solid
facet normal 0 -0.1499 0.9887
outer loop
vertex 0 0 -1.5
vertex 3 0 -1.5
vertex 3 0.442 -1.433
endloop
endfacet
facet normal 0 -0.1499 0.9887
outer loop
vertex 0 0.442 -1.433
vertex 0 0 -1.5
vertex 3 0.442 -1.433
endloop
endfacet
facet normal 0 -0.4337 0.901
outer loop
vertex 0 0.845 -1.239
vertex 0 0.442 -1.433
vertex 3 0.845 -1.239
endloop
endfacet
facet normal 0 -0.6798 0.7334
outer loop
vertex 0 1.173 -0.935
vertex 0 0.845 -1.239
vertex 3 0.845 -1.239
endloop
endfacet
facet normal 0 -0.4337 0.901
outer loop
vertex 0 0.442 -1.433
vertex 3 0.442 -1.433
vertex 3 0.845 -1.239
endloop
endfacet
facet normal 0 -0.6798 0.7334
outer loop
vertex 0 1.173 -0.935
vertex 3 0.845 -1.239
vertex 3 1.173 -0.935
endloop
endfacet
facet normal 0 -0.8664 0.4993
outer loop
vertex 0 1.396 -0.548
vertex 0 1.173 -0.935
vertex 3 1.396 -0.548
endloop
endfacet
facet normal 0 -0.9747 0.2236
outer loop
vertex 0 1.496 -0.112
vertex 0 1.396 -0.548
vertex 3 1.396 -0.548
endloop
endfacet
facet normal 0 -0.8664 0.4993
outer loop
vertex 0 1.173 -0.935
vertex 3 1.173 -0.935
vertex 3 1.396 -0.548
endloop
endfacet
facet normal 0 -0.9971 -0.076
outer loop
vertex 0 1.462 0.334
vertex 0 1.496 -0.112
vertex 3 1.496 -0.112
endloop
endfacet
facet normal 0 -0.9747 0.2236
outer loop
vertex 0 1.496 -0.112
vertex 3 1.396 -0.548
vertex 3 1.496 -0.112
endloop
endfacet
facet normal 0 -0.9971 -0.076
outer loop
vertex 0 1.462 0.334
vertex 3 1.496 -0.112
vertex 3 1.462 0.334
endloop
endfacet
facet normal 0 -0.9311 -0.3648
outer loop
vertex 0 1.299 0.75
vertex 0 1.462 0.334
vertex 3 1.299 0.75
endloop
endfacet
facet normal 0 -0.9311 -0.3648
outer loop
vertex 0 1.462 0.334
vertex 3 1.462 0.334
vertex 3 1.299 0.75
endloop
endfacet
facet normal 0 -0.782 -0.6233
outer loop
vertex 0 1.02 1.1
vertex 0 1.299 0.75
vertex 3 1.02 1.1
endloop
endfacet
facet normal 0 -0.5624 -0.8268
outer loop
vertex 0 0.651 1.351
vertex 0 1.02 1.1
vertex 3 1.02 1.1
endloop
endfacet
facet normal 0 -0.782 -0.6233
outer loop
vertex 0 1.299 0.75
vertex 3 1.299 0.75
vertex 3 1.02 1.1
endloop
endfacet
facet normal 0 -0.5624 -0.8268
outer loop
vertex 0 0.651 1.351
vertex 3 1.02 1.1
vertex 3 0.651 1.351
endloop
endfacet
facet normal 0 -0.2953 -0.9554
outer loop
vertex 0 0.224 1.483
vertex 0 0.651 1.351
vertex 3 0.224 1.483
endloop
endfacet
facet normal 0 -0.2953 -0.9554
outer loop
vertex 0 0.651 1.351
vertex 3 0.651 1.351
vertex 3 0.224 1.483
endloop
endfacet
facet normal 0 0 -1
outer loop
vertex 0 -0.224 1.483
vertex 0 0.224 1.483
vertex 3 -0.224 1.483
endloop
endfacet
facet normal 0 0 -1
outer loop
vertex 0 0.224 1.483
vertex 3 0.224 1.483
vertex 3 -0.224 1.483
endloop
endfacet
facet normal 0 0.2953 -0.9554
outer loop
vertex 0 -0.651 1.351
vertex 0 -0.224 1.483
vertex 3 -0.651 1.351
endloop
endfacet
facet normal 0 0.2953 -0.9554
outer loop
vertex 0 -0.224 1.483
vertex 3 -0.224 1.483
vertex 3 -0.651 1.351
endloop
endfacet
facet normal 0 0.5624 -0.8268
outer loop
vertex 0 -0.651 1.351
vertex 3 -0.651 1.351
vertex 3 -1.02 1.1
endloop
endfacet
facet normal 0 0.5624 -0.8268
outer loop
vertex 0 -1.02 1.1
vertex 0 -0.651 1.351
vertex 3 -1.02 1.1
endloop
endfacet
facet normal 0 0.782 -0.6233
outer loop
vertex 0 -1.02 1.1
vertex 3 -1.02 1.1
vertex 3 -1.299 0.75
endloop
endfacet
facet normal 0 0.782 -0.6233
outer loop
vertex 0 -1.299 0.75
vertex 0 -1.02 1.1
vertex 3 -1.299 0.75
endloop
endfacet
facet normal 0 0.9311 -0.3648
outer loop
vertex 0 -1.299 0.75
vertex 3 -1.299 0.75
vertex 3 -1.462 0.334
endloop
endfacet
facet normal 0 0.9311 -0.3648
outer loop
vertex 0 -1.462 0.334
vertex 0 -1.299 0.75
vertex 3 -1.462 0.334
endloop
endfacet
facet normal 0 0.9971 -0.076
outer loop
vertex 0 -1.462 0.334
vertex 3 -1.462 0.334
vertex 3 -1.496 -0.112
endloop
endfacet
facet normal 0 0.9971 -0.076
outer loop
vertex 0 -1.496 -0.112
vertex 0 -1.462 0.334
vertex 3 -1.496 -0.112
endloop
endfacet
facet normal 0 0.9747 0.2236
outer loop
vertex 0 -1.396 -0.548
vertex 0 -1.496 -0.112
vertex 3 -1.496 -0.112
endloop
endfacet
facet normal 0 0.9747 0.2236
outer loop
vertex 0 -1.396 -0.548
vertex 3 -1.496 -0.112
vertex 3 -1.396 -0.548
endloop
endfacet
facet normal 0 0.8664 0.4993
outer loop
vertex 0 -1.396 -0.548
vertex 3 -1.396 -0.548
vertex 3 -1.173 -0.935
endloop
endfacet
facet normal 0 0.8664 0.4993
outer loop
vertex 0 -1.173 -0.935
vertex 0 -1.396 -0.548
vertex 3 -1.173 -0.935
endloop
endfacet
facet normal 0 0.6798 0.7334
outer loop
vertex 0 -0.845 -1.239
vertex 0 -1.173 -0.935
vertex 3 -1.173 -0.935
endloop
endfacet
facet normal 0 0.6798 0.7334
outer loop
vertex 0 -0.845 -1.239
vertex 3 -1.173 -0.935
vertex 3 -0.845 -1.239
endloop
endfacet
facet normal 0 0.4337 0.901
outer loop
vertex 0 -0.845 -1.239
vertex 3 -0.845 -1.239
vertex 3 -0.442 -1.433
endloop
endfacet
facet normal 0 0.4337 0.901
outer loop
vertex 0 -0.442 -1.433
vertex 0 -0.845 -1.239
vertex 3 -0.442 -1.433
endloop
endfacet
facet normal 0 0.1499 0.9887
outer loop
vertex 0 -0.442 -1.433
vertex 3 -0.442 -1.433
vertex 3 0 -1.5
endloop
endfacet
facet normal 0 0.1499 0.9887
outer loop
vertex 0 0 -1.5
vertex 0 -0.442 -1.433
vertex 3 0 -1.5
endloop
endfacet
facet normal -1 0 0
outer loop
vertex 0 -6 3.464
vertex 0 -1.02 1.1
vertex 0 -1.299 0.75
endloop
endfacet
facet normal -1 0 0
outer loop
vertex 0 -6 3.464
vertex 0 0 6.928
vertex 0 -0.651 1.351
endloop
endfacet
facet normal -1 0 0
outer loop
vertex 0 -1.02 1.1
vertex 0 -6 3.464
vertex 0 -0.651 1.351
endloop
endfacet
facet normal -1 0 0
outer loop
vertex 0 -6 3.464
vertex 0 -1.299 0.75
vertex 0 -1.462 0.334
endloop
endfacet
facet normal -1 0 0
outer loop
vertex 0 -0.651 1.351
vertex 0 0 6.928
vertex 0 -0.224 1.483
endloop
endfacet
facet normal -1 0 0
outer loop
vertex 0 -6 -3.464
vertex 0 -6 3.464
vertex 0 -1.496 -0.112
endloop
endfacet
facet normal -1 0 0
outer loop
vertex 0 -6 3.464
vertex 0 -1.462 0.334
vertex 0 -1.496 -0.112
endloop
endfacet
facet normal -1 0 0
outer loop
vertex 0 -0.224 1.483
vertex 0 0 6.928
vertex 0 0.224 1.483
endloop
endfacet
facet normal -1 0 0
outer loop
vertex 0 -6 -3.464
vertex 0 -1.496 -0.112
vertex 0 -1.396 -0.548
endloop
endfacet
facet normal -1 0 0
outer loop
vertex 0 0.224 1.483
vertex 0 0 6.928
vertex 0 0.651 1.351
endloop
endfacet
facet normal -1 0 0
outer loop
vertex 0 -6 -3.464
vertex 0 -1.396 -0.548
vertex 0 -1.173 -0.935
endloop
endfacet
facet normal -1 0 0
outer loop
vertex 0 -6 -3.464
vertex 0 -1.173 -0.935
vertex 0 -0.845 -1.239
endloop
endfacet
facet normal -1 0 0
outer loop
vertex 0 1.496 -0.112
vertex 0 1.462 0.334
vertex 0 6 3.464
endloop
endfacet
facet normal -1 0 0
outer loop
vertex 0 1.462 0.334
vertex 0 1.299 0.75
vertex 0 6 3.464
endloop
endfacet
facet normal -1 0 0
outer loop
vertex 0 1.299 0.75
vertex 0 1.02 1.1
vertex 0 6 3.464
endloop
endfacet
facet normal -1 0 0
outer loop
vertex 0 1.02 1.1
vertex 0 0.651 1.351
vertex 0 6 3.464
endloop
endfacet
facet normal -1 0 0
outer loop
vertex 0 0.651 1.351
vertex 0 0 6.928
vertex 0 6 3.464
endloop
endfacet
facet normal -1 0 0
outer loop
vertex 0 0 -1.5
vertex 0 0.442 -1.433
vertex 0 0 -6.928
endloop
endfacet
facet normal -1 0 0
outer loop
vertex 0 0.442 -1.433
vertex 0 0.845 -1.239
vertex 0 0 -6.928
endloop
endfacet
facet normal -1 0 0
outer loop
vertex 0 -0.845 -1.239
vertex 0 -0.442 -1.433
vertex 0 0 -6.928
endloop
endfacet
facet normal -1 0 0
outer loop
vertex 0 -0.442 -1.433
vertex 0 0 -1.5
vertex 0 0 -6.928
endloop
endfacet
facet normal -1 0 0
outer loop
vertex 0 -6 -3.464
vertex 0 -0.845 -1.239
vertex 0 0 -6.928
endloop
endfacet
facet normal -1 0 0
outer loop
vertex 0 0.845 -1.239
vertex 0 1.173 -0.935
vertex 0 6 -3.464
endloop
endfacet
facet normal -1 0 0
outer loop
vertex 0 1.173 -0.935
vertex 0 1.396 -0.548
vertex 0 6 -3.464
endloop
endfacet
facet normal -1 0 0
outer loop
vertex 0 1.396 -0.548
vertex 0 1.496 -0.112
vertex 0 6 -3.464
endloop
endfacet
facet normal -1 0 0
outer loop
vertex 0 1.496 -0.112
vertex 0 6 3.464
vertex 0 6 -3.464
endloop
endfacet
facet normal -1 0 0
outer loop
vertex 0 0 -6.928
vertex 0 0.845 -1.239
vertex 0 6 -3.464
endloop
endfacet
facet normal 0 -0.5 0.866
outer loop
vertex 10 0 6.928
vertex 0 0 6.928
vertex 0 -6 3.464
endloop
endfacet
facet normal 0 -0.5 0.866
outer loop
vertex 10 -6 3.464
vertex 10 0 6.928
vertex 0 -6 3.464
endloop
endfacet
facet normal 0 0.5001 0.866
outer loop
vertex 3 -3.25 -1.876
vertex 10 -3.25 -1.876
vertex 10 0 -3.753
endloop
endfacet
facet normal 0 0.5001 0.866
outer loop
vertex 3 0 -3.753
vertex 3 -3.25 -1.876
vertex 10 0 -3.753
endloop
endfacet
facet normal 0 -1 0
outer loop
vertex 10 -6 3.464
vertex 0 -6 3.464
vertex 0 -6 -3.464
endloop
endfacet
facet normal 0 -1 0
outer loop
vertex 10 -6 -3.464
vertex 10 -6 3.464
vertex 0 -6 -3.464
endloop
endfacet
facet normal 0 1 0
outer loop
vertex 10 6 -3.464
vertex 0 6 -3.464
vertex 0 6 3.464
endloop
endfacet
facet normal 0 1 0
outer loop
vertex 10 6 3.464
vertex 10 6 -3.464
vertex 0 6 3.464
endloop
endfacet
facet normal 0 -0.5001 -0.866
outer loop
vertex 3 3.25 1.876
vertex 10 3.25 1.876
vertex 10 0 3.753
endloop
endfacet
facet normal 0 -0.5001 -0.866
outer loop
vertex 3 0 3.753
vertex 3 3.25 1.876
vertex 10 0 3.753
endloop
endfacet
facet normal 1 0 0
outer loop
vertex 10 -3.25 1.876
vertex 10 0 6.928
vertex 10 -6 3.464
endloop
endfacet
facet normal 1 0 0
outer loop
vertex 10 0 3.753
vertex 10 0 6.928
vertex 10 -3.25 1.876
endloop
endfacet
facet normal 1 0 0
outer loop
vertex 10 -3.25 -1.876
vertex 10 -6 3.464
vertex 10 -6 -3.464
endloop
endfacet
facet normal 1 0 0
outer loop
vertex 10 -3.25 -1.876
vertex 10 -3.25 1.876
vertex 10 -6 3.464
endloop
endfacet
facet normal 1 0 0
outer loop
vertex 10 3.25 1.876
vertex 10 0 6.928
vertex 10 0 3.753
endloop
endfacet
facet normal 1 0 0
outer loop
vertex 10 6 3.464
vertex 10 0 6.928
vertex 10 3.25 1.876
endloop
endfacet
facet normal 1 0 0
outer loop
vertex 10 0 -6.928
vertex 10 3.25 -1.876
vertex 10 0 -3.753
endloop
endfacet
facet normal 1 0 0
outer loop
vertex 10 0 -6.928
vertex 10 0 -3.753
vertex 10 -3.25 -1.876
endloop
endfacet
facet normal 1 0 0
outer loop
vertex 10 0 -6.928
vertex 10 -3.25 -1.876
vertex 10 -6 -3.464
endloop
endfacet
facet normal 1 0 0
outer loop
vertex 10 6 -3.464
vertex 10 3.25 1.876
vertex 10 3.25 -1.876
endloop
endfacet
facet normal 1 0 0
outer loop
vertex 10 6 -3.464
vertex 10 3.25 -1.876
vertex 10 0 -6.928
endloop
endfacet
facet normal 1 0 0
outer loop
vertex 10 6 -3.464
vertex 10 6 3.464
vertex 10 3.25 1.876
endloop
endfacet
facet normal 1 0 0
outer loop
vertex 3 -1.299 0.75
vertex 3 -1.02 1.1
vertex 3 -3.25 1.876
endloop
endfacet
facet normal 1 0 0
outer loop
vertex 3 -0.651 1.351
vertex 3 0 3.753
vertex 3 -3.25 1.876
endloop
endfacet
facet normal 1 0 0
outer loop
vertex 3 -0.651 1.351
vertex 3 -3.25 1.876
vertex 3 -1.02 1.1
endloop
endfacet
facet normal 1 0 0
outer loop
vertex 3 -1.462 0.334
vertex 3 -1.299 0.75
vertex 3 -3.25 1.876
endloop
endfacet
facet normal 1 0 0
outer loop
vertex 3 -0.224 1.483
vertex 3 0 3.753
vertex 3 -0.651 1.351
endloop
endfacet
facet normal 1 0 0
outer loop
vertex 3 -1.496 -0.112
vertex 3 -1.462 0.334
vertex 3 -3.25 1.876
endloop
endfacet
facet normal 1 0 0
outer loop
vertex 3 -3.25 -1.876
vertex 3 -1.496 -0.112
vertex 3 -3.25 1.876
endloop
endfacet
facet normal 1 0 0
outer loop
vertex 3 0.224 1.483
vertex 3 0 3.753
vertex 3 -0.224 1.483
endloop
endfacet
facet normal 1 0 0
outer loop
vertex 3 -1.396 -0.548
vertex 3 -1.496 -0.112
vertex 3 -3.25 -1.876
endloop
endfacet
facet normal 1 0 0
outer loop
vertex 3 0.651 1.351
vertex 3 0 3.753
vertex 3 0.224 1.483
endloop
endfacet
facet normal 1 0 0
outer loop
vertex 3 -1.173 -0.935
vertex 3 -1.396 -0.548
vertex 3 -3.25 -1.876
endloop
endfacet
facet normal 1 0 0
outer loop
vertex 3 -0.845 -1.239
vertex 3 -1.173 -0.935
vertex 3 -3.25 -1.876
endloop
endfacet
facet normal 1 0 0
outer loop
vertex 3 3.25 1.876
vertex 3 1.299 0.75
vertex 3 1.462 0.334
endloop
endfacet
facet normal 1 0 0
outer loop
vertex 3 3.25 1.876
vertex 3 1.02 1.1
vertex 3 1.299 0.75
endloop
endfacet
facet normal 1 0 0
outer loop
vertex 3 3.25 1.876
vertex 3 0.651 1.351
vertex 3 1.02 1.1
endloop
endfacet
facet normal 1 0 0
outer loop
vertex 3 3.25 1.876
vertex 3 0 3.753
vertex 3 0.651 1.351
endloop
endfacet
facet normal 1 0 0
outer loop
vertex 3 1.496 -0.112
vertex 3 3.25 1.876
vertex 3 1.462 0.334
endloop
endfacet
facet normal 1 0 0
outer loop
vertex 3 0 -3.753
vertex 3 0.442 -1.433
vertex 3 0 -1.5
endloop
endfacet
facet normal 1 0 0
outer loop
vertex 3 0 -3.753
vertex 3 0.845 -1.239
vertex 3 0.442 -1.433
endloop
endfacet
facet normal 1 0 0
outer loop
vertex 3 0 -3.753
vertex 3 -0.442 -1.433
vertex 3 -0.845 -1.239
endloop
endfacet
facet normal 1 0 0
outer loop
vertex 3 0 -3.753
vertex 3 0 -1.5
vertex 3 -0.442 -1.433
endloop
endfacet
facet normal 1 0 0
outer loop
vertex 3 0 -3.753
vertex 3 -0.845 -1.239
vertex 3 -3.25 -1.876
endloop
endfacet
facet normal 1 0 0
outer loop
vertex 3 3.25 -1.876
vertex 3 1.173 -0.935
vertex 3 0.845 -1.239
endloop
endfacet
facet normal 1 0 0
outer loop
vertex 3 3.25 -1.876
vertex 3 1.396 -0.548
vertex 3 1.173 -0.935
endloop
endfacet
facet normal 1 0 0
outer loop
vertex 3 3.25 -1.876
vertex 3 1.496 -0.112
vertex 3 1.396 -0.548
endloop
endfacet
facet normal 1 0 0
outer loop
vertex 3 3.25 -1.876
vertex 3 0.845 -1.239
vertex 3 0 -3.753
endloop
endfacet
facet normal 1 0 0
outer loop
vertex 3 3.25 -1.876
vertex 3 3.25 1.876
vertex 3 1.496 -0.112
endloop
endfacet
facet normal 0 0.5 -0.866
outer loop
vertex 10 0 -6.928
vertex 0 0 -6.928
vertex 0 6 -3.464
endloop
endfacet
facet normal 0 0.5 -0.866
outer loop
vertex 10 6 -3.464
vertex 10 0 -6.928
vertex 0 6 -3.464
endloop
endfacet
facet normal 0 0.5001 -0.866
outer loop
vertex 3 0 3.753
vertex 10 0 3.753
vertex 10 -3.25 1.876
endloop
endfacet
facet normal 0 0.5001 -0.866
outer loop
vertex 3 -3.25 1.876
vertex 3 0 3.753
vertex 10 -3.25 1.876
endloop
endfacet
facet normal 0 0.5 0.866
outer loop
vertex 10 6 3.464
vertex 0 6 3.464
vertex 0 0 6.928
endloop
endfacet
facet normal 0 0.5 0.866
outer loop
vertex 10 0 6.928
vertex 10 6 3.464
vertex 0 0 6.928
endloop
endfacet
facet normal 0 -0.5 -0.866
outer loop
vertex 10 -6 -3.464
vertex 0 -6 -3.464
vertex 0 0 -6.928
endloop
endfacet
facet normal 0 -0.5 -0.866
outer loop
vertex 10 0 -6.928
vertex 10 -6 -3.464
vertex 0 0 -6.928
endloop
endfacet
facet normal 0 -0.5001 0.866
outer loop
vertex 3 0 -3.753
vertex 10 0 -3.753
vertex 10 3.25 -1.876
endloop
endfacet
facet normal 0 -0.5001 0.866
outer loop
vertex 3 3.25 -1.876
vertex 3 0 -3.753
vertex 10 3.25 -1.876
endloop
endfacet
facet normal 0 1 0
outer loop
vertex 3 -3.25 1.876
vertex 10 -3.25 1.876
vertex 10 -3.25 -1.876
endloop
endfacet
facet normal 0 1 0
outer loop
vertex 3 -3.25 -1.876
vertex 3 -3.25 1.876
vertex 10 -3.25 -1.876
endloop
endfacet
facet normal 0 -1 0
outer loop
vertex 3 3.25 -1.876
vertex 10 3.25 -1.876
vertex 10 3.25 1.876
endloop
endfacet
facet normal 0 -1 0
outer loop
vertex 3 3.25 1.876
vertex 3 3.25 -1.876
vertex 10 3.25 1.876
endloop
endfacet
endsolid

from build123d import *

# Parameters (mm, degrees)
EXTRUDE_1_DEPTH     = 10
CUT_EXTRUDE_1_DEPTH = 7
SKETCH_3_R          = 1.5
CUT_EXTRUDE_2_DEPTH = 7


with BuildPart() as part:
    # 草图1 → 凸台-拉伸1 (new body)
    with BuildSketch(Plane(origin=(0, 0, 0), x_dir=(0, 0, -1), z_dir=(1, 0, 0))):
        Polygon((6.92820323, 0), (3.464101615, 6), (-3.464101615, 6), (-6.92820323, 0), (-3.464101615, -6), (3.464101615, -6), align=None)
    extrude(amount=EXTRUDE_1_DEPTH)

    # 草图2 → 切除-拉伸1 (cut)
    with BuildSketch(Plane(origin=(10, 0, 0), x_dir=(0, 0, -1), z_dir=(1, 0, 0))):
        Polygon((3.75277675, 0), (1.876388375, 3.25), (-1.876388375, 3.25), (-3.75277675, 0), (-1.876388375, -3.25), (1.876388375, -3.25), align=None)
    extrude(amount=-CUT_EXTRUDE_1_DEPTH, mode=Mode.SUBTRACT)

    # 草图3 → 切除-拉伸2 (cut)
    with BuildSketch(Plane(origin=(3, 0, 0), x_dir=(0, 0, -1), z_dir=(1, 0, 0))):
        Circle(SKETCH_3_R)
    extrude(amount=-CUT_EXTRUDE_2_DEPTH, mode=Mode.SUBTRACT)


solid = part.part
